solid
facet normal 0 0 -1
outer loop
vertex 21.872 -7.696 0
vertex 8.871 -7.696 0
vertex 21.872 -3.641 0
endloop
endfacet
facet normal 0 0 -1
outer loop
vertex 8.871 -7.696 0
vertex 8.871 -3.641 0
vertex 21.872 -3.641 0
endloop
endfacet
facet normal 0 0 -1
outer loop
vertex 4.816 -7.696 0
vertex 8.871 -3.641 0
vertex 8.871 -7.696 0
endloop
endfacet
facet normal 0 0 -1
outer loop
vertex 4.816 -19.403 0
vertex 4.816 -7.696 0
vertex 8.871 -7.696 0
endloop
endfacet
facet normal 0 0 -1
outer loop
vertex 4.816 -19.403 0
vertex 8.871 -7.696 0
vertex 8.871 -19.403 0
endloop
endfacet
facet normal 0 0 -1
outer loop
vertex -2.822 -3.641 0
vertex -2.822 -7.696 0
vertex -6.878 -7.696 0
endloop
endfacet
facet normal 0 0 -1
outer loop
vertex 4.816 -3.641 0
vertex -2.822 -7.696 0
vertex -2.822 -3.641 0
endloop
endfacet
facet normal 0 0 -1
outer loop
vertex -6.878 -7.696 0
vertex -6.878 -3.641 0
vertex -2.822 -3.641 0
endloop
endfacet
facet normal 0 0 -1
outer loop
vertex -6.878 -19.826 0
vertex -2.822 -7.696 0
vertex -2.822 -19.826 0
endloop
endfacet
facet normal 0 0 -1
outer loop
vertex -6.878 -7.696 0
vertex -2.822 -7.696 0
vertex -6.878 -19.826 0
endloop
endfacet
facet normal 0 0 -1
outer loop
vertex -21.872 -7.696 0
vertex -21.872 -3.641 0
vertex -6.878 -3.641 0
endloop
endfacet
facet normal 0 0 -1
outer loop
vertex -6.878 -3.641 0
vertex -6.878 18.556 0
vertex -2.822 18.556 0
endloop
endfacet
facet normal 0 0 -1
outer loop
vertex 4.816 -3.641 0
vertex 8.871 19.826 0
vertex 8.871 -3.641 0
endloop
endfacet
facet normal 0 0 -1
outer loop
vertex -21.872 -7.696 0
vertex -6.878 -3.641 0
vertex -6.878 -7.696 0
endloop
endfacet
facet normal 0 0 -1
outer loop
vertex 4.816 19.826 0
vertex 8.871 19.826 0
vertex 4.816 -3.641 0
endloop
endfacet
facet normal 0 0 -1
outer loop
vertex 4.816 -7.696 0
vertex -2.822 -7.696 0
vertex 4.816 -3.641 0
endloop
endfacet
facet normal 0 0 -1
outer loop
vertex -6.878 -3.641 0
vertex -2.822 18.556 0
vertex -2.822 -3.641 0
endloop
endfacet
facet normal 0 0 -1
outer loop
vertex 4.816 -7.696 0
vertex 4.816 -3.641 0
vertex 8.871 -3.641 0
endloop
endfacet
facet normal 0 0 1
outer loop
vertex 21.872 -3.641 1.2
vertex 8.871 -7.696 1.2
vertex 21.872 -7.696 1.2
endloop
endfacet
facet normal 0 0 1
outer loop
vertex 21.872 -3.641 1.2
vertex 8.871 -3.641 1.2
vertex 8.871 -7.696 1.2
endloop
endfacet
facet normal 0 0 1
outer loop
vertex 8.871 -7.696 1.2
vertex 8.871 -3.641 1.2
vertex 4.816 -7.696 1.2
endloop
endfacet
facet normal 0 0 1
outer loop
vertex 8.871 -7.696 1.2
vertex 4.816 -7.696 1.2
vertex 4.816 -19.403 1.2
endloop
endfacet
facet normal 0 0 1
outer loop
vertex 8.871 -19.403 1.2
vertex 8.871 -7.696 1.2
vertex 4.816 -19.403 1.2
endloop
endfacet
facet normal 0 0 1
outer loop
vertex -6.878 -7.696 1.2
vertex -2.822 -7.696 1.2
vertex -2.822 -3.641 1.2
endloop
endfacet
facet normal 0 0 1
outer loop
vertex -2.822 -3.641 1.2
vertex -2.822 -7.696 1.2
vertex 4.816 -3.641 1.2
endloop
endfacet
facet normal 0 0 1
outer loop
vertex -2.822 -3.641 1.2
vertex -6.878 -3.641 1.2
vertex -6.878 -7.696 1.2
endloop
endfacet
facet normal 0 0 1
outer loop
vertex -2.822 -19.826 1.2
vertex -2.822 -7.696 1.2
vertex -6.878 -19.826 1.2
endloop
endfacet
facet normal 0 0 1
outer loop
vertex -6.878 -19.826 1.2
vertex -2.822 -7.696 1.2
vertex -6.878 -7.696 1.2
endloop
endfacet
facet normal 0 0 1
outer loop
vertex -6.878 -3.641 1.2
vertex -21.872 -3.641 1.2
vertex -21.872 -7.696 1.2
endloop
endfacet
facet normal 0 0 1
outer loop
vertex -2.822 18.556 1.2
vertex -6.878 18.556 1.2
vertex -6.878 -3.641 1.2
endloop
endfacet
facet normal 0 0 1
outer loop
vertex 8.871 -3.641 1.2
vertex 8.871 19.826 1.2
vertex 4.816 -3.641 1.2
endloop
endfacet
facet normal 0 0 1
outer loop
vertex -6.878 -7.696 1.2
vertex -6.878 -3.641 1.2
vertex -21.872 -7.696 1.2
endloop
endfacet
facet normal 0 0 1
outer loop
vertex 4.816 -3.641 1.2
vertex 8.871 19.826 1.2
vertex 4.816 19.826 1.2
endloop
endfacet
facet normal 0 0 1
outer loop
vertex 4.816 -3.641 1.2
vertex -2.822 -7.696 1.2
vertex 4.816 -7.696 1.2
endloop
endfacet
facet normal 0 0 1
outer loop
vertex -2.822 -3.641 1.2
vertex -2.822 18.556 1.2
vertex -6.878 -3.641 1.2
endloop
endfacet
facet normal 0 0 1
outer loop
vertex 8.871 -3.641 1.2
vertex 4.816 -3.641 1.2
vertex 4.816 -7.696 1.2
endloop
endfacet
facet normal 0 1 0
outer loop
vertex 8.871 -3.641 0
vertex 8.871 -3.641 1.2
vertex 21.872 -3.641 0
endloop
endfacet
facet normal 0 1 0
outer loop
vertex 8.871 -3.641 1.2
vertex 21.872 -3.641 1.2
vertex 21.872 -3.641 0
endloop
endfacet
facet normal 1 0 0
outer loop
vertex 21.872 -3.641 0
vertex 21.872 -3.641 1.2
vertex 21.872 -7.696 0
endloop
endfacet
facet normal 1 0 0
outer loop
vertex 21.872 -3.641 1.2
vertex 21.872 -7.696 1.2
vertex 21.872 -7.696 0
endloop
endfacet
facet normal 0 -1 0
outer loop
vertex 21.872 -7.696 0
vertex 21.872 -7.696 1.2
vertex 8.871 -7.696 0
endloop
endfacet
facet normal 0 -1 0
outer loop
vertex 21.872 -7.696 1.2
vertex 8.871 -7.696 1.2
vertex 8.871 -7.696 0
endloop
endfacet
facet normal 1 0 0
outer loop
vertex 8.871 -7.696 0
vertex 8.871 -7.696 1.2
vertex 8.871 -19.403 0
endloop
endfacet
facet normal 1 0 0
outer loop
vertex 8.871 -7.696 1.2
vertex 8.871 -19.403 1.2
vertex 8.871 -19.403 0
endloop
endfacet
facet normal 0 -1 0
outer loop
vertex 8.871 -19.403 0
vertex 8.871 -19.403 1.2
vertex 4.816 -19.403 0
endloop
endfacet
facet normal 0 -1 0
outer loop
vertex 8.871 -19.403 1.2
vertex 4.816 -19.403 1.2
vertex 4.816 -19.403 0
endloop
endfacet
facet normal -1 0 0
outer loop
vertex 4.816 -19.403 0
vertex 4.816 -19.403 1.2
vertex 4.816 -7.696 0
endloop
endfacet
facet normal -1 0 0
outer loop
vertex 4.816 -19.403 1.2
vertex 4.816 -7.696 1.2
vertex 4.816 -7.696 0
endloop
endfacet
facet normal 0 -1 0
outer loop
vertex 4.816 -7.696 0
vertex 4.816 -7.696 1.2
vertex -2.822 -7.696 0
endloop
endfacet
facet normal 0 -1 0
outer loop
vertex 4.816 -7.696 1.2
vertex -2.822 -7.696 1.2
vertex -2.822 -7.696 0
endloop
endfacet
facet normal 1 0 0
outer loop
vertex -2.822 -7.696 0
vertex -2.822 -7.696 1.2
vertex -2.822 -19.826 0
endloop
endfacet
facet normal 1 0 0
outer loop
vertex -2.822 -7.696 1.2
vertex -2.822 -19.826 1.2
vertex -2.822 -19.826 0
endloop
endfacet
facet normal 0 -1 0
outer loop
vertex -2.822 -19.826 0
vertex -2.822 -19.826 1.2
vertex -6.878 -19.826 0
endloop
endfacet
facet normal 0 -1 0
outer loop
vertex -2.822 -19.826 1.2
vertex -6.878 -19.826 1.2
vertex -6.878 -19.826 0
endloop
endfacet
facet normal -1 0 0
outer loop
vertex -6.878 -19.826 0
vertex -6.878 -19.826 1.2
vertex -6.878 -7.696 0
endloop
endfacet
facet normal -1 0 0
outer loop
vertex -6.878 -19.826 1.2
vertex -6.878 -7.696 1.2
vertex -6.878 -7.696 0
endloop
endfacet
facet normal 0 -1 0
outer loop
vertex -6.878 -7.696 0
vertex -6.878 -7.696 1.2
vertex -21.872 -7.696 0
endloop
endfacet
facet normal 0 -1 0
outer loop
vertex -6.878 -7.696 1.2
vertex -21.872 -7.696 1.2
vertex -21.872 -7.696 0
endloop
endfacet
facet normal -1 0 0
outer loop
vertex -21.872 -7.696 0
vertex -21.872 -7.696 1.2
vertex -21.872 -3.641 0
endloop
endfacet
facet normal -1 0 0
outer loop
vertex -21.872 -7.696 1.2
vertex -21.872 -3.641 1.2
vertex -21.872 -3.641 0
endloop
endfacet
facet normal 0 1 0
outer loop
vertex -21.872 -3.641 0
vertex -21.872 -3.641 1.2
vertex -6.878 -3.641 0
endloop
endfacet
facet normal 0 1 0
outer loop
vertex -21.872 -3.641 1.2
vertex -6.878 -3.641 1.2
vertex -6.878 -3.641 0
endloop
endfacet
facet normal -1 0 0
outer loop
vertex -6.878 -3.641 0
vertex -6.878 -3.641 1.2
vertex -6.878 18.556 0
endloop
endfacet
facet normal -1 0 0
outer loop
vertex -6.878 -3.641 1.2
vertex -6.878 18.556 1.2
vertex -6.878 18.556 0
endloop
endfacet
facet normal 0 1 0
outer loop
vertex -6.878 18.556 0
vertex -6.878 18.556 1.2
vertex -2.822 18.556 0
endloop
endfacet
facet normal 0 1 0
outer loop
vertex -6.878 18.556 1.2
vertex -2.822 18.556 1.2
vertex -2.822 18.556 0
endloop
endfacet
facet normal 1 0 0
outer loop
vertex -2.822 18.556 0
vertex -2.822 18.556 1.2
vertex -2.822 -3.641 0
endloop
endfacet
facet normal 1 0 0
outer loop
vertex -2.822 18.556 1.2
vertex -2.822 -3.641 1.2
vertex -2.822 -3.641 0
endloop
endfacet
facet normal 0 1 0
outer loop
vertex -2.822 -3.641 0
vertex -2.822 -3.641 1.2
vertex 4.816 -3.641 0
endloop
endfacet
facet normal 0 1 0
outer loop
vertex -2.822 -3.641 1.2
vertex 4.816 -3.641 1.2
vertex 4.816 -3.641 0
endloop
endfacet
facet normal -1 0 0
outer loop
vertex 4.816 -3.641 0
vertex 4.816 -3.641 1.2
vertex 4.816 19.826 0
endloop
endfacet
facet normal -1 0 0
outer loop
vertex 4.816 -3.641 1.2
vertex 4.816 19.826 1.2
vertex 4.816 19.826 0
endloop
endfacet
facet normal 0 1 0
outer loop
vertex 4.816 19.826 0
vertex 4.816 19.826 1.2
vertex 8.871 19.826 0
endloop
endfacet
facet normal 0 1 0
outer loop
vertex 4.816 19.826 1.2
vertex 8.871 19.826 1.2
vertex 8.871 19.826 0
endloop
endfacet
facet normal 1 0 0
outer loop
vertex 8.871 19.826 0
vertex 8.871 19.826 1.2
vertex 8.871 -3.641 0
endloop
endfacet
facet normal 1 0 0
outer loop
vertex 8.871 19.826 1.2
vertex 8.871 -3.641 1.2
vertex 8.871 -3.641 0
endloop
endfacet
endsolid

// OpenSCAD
// Module names are of the form poly_<inkscape-path-id>().  As a result,
// you can associate a polygon in this OpenSCAD program with the corresponding
// SVG element in the Inkscape document by looking for the XML element with
// the attribute id="inkscape-path-id".

// fudge value is used to ensure that subtracted solids are a tad taller
// in the z dimension than the polygon being subtracted from.  This helps
// keep the resulting .stl file manifold.
fudge = 0.1;

module poly_rect414436(h)
{
  scale([25.4/90, -25.4/90, 1]) union()
  {
    linear_extrude(height=h)
      polygon([[17.064450,-70.249999],[17.064450,12.900388],[-10.000000,12.900388],[-10.000000,-65.749999],[-24.369141,-65.749999],[-24.369141,12.900388],[-77.500000,12.900388],[-77.500000,27.269528],[-24.369141,27.269528],[-24.369141,70.249998],[-10.000000,70.249998],[-10.000000,27.269528],[17.064450,27.269528],[17.064450,68.749998],[31.433590,68.749998],[31.433590,27.269528],[77.500000,27.269528],[77.500000,12.900388],[31.433590,12.900388],[31.433590,-70.249999],[17.064450,-70.249999]]);
  }
}

poly_rect414436(1.2000000476837158);
